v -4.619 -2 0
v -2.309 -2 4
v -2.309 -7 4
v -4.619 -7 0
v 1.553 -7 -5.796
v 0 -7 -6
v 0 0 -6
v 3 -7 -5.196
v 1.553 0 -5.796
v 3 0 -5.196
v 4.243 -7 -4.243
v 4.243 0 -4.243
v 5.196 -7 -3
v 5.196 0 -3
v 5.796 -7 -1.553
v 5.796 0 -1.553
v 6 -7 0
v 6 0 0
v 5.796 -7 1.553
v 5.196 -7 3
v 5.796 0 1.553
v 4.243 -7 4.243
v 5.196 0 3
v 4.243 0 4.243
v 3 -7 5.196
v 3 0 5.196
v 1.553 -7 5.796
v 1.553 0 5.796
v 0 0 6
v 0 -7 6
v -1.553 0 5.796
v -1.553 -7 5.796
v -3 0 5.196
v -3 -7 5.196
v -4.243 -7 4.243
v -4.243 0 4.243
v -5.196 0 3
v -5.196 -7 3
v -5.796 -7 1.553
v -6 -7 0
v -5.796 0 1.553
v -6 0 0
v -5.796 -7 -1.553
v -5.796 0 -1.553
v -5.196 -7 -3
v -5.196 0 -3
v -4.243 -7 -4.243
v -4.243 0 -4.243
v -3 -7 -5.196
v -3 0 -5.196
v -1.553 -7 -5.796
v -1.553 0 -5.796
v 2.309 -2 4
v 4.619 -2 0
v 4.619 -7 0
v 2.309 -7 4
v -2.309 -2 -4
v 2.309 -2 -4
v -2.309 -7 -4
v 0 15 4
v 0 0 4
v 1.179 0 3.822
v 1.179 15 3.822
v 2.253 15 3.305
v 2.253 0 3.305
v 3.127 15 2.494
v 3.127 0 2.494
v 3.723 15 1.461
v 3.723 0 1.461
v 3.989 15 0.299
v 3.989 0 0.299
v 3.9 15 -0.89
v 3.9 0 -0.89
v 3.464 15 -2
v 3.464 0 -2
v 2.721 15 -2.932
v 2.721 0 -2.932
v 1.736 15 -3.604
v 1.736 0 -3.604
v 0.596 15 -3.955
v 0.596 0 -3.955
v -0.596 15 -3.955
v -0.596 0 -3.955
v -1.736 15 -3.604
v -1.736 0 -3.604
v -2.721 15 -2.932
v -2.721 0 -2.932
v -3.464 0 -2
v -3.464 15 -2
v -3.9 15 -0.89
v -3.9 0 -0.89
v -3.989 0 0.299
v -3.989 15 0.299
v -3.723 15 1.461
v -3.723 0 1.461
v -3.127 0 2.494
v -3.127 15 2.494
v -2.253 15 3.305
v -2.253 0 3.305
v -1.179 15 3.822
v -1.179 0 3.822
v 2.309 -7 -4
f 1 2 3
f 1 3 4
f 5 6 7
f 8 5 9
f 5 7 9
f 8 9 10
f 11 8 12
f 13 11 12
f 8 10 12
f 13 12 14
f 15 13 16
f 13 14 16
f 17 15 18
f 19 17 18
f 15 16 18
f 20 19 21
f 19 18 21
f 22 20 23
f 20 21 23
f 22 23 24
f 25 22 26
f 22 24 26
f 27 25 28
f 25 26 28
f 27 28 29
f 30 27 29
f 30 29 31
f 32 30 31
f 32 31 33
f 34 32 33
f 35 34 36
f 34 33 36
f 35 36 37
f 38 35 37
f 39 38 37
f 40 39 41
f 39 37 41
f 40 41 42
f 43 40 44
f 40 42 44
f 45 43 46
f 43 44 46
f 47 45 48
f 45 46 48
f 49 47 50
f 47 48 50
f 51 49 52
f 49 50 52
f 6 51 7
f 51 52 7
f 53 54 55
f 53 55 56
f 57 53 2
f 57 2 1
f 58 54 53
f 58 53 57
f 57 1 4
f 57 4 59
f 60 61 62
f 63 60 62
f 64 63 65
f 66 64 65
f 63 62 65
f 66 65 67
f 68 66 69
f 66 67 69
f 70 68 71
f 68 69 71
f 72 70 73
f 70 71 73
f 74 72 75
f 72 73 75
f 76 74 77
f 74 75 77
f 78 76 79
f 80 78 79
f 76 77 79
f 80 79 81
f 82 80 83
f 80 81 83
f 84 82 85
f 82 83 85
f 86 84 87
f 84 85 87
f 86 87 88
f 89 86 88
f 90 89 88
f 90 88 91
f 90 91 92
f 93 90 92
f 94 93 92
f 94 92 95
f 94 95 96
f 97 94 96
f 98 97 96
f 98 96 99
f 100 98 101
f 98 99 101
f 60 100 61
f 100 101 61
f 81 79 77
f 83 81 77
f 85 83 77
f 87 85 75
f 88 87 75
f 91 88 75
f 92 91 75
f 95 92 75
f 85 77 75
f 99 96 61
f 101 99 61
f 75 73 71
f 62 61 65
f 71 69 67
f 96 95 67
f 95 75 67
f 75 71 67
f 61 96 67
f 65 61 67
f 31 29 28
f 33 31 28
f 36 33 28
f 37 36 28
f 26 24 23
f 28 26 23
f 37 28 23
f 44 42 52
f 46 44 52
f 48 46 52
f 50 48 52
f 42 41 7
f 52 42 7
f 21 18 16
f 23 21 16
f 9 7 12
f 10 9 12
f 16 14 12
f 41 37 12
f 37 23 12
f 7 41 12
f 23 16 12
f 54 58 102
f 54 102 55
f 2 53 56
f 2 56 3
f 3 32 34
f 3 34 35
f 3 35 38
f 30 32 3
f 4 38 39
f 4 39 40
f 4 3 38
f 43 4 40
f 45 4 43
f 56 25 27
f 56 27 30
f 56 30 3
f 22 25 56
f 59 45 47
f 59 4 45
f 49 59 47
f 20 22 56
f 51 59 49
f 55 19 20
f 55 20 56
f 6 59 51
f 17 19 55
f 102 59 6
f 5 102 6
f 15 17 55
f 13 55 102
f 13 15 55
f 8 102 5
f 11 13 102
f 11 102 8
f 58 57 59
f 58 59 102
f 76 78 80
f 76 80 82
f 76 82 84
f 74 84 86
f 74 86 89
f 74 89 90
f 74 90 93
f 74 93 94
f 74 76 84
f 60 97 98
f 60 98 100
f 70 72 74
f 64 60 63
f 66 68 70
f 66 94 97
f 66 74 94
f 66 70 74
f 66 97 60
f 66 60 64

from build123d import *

# Parameters (mm, degrees)
SKETCH1_R           = 4
BOSS_EXTRUDE1_DEPTH = 15
SKETCH2_R           = 6
SKETCH2_R_2         = 4
BOSS_EXTRUDE2_DEPTH = 2
SKETCH3_R           = 6
BOSS_EXTRUDE3_DEPTH = 5


with BuildPart() as part:
    # Sketch1 → Boss-Extrude1 (new body)
    with BuildSketch(Plane(origin=(0, 0, 0), x_dir=(1, 0, 0), z_dir=(0, 1, 0))):
        with Locations(Location((0, 0, 0), (0, 0, 270))):
            Circle(SKETCH1_R)
    extrude(amount=BOSS_EXTRUDE1_DEPTH)


with BuildPart() as body_2:
    # Sketch2 → Boss-Extrude2 (new body)
    with BuildSketch(Plane.XZ):
        with Locations(Location((0, 0, 0), (0, 0, 270))):
            Circle(SKETCH2_R)
        with Locations(Location((0, 0, 0), (0, 0, 90))):
            Circle(SKETCH2_R_2, mode=Mode.SUBTRACT)
        with Locations(Location((0, 0, 0), (0, 0, 90))):
            Circle(SKETCH2_R_2)
    extrude(amount=BOSS_EXTRUDE2_DEPTH)

    # Sketch3 → Boss-Extrude3 (add)
    with BuildSketch(Plane.XZ.offset(2)):
        with Locations(Location((0, 0, 0), (0, 0, 270))):
            Circle(SKETCH3_R)
        Polygon((4.618802154, 0), (2.309401077, 4), (-2.309401077, 4), (-4.618802154, 0), (-2.309401077, -4), (2.309401077, -4), align=None, mode=Mode.SUBTRACT)
    extrude(amount=BOSS_EXTRUDE3_DEPTH)


solid = Compound([part.part, body_2.part])
